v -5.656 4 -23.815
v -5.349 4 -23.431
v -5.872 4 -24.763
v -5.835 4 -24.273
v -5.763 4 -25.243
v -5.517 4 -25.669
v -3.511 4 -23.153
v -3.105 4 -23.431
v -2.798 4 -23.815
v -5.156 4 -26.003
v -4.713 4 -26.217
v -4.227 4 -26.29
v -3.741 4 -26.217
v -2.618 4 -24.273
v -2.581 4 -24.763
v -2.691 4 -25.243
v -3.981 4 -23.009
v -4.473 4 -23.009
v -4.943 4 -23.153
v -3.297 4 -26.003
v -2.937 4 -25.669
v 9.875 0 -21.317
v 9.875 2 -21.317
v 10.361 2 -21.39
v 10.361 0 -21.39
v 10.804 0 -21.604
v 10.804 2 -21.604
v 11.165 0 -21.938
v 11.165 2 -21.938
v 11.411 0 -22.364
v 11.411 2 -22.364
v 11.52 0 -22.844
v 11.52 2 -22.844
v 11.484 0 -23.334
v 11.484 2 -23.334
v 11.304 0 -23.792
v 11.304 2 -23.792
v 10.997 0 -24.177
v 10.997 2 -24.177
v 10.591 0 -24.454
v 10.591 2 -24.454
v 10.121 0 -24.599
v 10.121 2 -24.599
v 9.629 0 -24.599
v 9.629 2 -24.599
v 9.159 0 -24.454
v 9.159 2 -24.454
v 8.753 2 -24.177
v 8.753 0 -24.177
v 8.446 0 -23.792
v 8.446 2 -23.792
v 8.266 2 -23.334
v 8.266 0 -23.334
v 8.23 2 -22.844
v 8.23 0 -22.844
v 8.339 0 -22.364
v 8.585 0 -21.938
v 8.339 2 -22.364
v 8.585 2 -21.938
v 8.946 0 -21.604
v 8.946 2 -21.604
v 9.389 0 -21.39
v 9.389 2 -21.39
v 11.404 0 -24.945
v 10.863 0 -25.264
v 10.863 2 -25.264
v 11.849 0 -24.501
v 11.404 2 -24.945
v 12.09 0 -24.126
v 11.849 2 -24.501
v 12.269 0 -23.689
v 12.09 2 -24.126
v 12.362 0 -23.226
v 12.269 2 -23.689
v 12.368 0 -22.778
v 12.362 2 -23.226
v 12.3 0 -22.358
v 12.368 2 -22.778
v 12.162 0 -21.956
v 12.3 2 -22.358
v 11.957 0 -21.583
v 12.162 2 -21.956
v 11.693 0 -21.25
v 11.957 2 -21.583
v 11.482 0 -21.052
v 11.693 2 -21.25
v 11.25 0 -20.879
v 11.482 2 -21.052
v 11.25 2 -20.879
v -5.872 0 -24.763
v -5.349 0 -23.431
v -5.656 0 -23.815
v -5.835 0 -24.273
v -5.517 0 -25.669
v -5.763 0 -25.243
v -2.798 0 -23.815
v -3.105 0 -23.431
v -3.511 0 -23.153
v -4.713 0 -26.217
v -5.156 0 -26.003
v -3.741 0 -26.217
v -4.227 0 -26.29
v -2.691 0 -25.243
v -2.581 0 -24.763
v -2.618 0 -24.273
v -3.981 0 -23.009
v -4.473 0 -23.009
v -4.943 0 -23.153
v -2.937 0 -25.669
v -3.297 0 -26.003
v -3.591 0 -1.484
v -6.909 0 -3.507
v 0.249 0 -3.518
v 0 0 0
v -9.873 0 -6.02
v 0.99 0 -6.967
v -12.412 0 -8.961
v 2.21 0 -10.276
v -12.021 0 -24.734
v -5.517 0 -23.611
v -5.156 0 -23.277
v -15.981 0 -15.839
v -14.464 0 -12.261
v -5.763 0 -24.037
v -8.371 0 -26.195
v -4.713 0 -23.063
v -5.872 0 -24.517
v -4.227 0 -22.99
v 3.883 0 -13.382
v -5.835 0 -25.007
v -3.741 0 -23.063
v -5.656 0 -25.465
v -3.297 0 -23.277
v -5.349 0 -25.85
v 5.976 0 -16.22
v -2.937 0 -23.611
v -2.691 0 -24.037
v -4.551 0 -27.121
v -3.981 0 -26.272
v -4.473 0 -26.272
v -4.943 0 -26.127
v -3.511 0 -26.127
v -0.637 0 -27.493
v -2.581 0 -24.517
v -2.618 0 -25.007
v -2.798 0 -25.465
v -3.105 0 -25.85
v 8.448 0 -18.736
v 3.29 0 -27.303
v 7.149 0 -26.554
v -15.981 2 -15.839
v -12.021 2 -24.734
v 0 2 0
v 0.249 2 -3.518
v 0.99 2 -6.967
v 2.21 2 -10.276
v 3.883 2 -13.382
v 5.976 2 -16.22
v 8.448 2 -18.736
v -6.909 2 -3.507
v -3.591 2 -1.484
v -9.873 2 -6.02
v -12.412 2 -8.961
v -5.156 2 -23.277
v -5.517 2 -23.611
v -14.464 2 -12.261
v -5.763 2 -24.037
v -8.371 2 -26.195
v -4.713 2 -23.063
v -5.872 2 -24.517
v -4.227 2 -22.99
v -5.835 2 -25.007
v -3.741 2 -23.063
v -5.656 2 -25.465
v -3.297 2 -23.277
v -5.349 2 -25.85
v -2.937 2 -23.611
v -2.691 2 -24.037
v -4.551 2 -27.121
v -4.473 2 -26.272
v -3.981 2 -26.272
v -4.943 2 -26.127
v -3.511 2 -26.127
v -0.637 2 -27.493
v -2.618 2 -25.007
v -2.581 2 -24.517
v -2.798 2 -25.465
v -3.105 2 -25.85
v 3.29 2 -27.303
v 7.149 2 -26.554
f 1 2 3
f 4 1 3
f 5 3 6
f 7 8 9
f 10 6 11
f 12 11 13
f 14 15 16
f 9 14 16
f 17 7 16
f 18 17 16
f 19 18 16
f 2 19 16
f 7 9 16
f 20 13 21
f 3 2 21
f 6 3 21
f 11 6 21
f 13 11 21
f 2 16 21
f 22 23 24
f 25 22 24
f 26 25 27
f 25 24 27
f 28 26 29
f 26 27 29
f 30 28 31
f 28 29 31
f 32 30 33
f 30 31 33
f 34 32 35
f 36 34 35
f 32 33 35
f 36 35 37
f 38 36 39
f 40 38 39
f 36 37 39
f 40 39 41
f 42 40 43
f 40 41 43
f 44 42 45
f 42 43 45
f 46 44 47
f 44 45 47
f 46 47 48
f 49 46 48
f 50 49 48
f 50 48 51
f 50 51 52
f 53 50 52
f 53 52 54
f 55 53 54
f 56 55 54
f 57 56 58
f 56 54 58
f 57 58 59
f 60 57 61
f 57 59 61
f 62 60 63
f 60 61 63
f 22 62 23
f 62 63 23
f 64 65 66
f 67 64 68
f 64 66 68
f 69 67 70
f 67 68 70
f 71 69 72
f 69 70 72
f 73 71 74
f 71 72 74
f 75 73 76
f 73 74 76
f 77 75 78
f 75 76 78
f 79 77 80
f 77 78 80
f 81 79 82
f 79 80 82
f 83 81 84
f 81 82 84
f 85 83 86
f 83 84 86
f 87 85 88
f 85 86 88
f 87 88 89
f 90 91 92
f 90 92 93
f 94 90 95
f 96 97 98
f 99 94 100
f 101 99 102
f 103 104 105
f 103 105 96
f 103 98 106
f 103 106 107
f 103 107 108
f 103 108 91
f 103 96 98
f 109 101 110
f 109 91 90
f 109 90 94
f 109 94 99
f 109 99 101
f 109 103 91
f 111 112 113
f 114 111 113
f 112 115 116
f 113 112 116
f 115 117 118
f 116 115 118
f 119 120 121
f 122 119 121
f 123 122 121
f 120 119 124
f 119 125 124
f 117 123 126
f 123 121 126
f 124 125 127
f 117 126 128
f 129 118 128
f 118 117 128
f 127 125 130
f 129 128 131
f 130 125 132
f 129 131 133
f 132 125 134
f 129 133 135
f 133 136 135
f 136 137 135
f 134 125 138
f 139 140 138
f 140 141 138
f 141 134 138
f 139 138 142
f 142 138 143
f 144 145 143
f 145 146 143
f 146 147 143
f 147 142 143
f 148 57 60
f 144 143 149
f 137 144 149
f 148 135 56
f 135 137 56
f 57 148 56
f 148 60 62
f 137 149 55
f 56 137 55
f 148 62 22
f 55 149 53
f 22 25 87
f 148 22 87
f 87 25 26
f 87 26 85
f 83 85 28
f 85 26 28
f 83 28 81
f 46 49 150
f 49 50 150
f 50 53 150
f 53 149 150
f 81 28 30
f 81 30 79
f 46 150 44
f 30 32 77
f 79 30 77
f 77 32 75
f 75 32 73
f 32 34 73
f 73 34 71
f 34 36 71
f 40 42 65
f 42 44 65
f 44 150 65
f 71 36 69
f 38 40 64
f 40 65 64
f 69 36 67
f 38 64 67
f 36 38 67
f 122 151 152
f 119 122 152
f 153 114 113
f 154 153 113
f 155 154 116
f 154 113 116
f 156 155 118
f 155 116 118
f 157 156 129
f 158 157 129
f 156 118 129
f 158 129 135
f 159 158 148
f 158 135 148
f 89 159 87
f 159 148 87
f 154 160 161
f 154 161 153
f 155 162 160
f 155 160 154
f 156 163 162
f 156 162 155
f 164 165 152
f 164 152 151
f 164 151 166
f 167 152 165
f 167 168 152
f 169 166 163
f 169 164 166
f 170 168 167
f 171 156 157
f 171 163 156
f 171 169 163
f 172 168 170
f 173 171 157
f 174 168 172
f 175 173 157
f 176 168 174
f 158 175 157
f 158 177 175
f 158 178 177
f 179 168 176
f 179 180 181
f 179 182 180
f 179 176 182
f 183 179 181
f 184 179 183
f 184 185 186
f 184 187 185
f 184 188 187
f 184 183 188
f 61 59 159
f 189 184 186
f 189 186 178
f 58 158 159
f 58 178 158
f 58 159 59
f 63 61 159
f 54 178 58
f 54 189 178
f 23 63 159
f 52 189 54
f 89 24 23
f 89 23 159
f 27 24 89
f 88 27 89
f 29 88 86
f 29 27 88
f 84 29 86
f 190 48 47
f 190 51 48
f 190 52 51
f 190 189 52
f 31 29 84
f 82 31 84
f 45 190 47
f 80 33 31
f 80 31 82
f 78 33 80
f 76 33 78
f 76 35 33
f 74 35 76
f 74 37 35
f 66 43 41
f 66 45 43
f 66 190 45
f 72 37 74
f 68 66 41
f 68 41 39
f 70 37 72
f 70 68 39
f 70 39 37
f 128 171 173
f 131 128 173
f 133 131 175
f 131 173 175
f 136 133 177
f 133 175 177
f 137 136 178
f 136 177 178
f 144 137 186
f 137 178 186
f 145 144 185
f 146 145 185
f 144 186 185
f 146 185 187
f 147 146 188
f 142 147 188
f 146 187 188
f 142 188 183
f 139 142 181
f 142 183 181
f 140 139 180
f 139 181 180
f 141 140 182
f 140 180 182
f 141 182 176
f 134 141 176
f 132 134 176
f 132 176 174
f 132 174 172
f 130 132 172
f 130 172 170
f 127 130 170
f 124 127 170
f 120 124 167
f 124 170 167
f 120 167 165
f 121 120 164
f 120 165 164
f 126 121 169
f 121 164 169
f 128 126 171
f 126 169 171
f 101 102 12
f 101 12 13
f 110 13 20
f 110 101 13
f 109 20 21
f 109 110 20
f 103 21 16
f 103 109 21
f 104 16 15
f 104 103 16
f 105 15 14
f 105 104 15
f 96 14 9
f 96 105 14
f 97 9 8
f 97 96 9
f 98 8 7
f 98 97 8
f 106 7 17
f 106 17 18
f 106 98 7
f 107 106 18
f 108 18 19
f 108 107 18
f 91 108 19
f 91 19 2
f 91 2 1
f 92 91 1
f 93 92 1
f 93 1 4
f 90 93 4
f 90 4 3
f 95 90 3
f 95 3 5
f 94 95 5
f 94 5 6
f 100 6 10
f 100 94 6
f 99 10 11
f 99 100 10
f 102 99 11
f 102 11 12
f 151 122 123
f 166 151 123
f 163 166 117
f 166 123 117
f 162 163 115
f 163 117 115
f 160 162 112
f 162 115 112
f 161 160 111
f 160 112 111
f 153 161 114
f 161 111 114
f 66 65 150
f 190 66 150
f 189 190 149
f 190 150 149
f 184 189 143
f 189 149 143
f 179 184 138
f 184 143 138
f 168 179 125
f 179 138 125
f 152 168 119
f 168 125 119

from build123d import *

# Parameters (mm, degrees)
BOSS_EXTRUDE1_DEPTH = 2
FILLET1_R           = 2.5
SKETCH2_R           = 1.65
CUT_EXTRUDE1_DEPTH  = 2
CUT_EXTRUDE2_REACH  = 34.399
SKETCH6_R           = 1.65
BOSS_EXTRUDE2_DEPTH = 4


with BuildPart() as part:
    # Sketch1 → Boss-Extrude1 (new body)
    with BuildSketch(Plane(origin=(0, 0, 0), x_dir=(1, 0, 0), z_dir=(0, 1, 0))):
        with BuildLine():
            ThreePointArc((15.125, 22.967027997), (-1.263298306, 27.470967901), (-17.169059596, 21.48193177))
            ThreePointArc((-17.169059596, 21.48193177), (-11.803604023, 8.168176911), (0, 0))
            ThreePointArc((0, 0), (4.120883639, 13.75), (15.125, 22.967027997))
        make_face()
    extrude(amount=BOSS_EXTRUDE1_DEPTH)

    # Fillet1
    fillet1_edges = [part.edges().sort_by_distance(p)[0] for p in [
        (-17.169059596, 1, -21.48193177),
        (15.125, 1, -22.967027997),
    ]]
    fillet(fillet1_edges, radius=FILLET1_R)

    # Sketch2 → Cut-Extrude1 (cut)
    with BuildSketch(Plane(origin=(0, 2, 0), x_dir=(1, 0, 0), z_dir=(0, 1, 0))):
        with Locations(Location((-4.226868107, 24.640080885, 0), (0, 0, 270))):
            Circle(SKETCH2_R)
        with Locations(Location((9.875, 22.967027997, 0), (0, 0, 270))):
            Circle(SKETCH2_R)
    extrude(amount=-CUT_EXTRUDE1_DEPTH, mode=Mode.SUBTRACT)

    # Sketch3 → Cut-Extrude2 (cut, up to next)
    with BuildSketch(Plane(origin=(0, 2, 0), x_dir=(1, 0, 0), z_dir=(0, 1, 0)), mode=Mode.PRIVATE) as cut_extrude2_sk1:
        with BuildLine():
            Line((-15.980917027, 15.838569726), (-12.020745702, 24.733614228))
            ThreePointArc((-12.020745702, 24.733614228), (-14.04148027, 23.645017061), (-15.964394934, 22.391696997))
            ThreePointArc((-15.964394934, 22.391696997), (-16.816313344, 21.328273965), (-16.984031989, 19.976052098))
            ThreePointArc((-16.984031989, 19.976052098), (-16.570708205, 17.885919028), (-15.980917027, 15.838569726))
        make_face()
    cut_extrude2_tool1 = extrude(cut_extrude2_sk1.sketch, amount=-CUT_EXTRUDE2_REACH, mode=Mode.PRIVATE) & part.part
    add(cut_extrude2_tool1.solids().sort_by_distance((-15.061244, 2, -20.693622))[0], mode=Mode.SUBTRACT)


with BuildPart() as body_2:
    # Sketch6 → Boss-Extrude2 (new body)
    with BuildSketch(Plane.XZ):
        with Locations(Location((-4.226868107, -24.640080885, 0), (0, 0, 270))):
            Circle(SKETCH6_R)
    extrude(amount=-BOSS_EXTRUDE2_DEPTH)


solid = Compound([part.part, body_2.part])
